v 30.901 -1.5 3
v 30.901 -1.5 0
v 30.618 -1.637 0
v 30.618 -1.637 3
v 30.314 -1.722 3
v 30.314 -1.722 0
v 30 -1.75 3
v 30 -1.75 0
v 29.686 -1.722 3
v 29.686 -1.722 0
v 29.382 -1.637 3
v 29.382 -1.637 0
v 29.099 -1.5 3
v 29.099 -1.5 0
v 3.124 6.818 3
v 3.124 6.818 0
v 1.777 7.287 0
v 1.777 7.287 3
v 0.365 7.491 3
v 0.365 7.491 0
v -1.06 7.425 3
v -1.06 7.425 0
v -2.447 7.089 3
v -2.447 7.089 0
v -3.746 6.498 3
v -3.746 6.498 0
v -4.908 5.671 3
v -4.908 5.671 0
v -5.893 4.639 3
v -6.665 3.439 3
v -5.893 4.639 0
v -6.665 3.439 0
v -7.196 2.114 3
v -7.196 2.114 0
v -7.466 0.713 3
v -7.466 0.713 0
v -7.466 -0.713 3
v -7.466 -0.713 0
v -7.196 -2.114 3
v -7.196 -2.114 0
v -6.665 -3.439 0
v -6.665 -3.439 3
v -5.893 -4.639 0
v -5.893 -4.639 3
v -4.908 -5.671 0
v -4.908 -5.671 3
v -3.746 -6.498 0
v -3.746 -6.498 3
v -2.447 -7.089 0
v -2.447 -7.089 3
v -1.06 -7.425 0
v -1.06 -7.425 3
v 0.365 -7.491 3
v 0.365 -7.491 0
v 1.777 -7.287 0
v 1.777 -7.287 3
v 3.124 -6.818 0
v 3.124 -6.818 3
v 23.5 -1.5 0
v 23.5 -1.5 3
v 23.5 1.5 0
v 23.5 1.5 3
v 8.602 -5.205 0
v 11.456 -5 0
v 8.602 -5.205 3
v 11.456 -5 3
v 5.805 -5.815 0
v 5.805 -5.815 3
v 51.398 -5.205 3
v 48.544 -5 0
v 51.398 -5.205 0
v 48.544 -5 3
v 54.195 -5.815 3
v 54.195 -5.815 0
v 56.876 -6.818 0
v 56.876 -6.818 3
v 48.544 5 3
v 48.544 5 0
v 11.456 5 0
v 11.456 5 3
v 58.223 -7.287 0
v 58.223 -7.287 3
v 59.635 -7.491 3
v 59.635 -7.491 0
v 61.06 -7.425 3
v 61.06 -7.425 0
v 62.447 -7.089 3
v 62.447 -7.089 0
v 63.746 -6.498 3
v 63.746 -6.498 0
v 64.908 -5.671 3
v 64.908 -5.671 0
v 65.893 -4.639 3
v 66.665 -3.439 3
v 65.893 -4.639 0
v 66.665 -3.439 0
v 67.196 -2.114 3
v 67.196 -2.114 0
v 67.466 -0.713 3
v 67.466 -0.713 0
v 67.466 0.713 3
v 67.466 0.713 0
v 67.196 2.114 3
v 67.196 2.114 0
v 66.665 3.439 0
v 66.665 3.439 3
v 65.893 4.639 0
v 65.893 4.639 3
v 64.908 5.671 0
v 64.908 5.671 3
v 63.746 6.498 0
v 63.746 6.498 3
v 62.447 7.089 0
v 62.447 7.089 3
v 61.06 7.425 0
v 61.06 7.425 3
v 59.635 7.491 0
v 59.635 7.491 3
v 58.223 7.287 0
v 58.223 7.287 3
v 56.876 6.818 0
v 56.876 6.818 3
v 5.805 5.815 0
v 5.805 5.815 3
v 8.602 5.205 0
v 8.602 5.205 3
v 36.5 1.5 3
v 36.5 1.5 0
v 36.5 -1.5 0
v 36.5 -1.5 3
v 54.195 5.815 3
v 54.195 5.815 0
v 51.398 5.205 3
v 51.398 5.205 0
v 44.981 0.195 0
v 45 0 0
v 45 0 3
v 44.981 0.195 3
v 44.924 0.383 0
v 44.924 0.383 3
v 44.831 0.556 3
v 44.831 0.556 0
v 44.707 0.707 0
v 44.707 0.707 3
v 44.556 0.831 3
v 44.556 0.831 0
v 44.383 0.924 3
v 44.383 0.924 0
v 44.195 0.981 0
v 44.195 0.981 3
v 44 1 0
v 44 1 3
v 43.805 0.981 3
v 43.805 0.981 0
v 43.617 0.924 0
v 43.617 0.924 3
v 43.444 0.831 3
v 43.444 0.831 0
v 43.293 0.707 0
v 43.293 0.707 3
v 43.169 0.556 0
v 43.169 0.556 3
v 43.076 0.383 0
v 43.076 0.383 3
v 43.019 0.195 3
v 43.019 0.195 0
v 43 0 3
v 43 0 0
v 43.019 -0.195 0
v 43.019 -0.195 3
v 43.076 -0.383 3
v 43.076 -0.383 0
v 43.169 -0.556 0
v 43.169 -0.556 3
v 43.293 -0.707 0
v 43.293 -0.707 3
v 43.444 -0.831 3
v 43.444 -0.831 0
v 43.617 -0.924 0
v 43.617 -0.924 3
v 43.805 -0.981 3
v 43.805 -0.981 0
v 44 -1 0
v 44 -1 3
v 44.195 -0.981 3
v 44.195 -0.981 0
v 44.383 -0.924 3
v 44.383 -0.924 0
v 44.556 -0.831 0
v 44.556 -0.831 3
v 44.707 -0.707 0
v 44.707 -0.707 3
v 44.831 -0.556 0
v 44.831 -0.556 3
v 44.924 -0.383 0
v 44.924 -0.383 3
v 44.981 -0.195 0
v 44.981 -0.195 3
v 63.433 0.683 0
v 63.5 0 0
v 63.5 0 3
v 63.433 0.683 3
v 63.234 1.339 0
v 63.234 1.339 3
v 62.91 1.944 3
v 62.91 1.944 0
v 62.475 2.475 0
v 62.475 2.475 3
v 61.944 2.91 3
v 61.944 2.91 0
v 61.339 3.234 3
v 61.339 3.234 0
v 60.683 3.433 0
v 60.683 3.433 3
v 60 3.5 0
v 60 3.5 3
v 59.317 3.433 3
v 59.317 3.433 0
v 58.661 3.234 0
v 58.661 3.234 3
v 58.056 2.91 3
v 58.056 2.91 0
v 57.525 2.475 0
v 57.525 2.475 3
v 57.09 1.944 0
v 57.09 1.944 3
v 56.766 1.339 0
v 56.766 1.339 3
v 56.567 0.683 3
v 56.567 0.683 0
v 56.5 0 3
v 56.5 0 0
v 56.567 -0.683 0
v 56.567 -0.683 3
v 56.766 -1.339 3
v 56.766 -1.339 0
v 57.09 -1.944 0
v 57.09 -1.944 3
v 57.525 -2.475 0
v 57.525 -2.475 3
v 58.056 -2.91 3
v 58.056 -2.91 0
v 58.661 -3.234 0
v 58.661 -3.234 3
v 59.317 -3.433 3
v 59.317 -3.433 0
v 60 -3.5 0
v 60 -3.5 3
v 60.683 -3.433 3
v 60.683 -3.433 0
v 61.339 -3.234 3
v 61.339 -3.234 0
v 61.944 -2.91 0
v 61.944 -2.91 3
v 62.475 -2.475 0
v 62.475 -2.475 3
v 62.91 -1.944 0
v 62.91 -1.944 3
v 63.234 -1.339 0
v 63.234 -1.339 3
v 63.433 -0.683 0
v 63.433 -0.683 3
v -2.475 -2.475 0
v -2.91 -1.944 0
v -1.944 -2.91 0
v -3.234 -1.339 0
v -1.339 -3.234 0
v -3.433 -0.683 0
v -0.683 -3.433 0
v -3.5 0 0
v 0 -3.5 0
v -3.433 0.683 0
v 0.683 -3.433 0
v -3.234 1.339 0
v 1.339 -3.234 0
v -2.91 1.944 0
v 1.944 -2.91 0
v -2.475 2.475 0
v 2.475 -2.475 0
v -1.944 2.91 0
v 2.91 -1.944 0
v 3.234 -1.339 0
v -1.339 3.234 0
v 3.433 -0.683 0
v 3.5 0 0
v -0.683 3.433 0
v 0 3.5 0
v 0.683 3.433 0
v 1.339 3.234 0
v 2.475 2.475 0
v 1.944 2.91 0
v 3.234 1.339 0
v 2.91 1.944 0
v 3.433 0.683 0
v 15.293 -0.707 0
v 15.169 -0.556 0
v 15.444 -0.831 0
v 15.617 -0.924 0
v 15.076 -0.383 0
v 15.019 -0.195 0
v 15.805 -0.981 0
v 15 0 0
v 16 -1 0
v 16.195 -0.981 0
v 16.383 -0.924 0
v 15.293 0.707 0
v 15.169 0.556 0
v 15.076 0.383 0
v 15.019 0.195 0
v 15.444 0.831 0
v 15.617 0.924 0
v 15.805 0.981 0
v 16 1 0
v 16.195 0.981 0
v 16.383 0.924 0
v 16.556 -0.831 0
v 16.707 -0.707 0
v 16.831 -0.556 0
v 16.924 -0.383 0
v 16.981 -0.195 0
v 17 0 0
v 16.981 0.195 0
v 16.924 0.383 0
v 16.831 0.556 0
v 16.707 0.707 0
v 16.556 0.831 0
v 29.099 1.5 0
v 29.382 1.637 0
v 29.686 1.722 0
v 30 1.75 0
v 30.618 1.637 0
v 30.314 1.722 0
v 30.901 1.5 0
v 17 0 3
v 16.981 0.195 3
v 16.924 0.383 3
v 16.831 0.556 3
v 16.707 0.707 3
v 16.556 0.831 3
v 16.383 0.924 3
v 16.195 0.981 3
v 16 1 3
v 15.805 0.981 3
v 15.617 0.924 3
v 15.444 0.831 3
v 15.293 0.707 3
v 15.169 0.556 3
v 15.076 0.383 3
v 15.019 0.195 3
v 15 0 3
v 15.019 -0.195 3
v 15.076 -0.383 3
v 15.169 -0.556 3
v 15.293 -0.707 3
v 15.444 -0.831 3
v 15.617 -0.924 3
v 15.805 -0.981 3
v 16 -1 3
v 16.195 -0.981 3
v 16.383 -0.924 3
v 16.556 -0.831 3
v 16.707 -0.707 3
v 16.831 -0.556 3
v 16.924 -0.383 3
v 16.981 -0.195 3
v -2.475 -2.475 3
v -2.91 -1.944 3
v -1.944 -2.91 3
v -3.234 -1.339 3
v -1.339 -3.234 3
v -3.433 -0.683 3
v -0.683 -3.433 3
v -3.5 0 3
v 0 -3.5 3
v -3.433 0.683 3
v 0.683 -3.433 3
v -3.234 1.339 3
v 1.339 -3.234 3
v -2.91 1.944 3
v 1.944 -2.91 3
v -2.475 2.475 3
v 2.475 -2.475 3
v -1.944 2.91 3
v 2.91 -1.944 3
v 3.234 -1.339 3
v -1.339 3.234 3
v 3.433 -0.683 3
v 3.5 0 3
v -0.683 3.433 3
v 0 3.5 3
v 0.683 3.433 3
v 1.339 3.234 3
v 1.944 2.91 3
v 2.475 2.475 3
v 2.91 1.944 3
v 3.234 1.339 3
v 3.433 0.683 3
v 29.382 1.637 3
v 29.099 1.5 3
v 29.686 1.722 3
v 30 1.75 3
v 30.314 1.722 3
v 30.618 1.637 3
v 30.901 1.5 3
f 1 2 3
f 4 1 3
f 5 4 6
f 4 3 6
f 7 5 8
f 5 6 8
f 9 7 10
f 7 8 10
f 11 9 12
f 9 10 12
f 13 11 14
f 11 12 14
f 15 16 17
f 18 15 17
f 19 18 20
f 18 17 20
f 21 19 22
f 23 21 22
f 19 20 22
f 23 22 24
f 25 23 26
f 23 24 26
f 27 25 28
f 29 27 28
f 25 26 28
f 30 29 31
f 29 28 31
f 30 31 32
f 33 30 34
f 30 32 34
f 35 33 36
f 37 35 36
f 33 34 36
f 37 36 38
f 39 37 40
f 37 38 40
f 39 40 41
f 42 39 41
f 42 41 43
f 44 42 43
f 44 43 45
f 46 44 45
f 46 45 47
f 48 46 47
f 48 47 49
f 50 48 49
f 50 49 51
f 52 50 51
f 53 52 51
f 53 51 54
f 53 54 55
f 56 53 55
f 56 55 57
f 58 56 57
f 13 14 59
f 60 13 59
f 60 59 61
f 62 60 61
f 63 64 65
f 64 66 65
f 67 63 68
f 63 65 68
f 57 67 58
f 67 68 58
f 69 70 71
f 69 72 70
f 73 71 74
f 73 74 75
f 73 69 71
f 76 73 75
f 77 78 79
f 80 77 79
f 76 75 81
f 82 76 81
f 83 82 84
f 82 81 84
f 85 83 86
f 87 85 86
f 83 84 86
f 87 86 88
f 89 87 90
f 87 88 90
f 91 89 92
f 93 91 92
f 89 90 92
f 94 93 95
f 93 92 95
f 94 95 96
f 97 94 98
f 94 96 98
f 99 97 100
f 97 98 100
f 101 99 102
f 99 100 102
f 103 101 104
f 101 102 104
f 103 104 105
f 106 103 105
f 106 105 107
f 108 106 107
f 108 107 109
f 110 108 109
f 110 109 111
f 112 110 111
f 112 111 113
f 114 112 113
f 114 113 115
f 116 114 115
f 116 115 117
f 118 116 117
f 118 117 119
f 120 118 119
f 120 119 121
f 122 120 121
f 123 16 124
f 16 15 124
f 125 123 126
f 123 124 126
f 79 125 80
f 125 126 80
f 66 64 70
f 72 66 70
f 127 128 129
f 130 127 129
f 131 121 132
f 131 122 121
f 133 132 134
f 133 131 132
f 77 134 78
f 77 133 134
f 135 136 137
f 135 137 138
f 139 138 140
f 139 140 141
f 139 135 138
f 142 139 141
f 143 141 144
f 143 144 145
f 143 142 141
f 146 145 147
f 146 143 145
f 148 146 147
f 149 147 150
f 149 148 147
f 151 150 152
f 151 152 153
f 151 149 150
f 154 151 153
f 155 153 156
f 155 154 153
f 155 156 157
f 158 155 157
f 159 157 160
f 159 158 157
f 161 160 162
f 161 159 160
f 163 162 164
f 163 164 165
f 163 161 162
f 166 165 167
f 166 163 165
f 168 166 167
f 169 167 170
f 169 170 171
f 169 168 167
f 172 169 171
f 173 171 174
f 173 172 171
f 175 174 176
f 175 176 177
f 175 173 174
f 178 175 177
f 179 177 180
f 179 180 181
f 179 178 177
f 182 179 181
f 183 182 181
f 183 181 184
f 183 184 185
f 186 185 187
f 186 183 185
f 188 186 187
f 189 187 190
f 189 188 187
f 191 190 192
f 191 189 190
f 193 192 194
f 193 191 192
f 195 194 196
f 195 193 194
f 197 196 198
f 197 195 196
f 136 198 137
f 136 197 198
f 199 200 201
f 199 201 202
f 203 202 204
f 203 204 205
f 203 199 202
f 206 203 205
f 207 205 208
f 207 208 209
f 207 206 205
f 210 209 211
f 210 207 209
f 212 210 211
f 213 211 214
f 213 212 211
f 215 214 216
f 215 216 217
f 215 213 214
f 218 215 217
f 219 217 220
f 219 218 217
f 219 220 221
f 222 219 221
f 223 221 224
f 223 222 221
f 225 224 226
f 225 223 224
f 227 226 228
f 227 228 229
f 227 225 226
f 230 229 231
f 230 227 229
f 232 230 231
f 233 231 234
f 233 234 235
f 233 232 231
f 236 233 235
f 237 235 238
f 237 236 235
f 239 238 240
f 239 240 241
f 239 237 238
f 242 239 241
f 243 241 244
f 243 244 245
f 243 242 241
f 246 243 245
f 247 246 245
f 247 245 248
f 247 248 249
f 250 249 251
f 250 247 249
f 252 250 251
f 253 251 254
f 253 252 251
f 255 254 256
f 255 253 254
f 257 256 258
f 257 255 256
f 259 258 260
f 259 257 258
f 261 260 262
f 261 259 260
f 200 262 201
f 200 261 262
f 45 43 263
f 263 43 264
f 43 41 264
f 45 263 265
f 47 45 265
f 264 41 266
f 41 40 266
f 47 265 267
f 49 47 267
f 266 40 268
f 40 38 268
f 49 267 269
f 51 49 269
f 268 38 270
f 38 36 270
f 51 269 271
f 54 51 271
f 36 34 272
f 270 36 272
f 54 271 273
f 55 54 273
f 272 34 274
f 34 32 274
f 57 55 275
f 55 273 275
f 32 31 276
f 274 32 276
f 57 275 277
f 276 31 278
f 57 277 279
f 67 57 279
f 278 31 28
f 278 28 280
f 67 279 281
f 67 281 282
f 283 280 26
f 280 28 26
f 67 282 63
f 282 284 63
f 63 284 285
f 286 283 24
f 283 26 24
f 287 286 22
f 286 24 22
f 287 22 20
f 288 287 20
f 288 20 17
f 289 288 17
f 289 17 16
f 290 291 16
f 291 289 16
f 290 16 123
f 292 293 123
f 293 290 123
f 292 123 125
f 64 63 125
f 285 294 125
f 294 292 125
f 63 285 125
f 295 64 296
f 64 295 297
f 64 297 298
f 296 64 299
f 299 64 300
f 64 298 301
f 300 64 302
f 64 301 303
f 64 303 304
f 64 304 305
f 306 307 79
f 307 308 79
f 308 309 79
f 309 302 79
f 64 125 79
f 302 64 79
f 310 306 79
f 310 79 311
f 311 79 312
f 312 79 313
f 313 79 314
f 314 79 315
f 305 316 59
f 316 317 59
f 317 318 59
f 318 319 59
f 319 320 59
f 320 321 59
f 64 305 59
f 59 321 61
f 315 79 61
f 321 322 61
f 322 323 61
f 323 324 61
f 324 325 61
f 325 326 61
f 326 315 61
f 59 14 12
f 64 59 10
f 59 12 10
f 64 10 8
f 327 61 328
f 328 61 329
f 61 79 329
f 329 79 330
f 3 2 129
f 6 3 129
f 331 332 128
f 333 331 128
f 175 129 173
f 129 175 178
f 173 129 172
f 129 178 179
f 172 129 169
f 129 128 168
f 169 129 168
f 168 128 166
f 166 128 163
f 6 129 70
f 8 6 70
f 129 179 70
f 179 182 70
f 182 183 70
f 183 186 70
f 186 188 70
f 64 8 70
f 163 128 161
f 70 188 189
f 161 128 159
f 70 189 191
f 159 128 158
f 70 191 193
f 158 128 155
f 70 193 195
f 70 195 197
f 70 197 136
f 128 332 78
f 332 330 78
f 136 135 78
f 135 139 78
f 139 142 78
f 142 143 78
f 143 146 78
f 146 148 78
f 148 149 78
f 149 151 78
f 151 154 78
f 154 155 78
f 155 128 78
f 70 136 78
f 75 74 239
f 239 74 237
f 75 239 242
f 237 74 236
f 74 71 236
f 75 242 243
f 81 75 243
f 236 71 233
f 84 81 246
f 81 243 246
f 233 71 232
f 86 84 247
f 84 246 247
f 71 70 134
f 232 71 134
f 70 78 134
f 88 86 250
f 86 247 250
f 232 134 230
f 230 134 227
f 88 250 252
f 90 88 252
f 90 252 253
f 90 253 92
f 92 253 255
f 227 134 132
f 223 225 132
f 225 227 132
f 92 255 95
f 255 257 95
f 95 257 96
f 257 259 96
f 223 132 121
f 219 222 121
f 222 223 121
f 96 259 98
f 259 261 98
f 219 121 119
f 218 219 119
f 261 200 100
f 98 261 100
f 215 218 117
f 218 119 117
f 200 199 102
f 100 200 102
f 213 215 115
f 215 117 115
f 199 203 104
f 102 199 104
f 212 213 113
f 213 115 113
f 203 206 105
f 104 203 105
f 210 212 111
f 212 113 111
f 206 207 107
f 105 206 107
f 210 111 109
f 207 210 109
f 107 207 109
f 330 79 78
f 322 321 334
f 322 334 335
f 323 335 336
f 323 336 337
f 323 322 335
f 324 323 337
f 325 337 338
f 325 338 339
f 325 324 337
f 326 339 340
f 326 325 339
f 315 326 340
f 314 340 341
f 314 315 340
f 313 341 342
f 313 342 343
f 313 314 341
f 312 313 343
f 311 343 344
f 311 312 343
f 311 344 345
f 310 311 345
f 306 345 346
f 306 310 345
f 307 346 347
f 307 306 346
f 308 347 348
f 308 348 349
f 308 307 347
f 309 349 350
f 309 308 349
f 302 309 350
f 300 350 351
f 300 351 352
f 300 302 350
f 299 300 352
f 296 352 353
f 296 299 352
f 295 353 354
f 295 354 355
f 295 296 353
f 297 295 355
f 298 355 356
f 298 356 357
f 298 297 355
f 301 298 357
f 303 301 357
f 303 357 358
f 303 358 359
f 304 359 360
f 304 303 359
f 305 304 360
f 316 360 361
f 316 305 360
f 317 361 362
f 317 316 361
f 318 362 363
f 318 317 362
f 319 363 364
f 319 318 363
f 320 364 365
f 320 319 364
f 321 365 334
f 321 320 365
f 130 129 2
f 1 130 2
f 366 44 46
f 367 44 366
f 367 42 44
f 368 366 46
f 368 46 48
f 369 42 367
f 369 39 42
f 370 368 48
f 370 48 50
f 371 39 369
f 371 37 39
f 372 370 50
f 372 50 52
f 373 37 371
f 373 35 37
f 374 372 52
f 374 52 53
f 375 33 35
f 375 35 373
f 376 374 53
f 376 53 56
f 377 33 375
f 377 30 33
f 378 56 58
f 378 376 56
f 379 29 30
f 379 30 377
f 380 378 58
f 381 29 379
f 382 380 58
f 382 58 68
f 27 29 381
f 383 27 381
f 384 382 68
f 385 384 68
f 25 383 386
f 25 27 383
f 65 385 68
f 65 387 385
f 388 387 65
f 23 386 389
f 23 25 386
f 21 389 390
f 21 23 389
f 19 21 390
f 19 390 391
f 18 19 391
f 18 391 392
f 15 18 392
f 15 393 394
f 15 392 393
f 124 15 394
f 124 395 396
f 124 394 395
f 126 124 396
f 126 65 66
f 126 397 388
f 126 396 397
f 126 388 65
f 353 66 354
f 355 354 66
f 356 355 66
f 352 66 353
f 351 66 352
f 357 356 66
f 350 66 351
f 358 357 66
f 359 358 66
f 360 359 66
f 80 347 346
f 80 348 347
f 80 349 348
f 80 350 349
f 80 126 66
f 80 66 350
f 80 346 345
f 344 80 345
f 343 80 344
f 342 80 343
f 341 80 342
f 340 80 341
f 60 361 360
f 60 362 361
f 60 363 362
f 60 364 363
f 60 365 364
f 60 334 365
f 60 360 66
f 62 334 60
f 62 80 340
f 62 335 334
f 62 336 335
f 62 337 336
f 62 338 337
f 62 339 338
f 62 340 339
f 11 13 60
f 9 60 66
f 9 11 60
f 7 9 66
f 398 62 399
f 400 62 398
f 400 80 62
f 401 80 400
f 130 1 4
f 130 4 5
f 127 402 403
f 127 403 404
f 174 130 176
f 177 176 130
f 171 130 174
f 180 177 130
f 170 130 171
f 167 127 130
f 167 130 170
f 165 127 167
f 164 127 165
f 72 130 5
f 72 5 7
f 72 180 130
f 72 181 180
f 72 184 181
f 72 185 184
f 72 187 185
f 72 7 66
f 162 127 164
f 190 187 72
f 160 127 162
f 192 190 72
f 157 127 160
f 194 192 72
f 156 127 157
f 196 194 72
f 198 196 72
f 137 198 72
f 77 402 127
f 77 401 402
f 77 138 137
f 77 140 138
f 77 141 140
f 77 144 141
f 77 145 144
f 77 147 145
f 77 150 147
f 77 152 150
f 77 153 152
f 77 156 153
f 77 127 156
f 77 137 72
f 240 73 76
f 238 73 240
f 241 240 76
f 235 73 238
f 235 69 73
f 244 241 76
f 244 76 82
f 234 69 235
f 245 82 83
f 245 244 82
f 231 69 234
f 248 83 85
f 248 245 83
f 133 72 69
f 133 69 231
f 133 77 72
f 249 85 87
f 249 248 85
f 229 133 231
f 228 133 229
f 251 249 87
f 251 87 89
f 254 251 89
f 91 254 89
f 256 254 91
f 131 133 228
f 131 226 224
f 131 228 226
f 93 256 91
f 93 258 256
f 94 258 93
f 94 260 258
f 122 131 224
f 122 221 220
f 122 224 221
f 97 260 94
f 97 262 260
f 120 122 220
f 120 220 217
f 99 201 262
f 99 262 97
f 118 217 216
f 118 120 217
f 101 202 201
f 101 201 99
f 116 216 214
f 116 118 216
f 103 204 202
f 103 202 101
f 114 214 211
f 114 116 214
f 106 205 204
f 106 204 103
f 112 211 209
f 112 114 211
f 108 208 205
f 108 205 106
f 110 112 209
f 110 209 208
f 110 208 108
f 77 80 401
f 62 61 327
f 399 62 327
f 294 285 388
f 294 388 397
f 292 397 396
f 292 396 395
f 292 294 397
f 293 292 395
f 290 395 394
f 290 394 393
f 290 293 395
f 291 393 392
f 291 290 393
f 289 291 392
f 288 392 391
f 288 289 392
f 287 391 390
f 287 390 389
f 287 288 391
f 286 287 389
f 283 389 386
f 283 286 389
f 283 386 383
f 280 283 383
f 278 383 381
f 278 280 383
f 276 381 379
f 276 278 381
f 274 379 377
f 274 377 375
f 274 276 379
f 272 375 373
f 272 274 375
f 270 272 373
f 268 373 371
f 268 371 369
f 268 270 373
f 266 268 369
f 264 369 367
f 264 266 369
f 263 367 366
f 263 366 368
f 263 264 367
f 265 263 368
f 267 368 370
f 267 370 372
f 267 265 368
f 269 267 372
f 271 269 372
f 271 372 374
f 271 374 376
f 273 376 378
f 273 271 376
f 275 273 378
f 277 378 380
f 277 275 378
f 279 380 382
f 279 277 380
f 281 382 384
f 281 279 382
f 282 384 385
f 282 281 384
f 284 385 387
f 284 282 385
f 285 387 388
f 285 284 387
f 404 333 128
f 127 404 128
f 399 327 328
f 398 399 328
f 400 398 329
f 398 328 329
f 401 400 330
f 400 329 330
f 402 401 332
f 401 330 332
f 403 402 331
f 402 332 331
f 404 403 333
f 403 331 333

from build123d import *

# Parameters (mm, degrees)
ESBO_O1_R                = 1
ESBO_O1_R_2              = 3.5
RESSALTO_EXTRUS_O1_DEPTH = 3
FILETE1_R                = 20


with BuildPart() as part:
    # Esboço1 → Ressalto-extrusão1 (new body)
    with BuildSketch(Plane.XY):
        with BuildLine():
            Line((5.590169944, -5), (54.409830056, -5))
            ThreePointArc((54.409830056, -5), (67.5, 0), (54.409830056, 5))
            Line((54.409830056, 5), (5.590169944, 5))
            ThreePointArc((5.590169944, 5), (-7.5, 0), (5.590169944, -5))
        make_face()
        with Locations((44, 0)):
            Circle(ESBO_O1_R, mode=Mode.SUBTRACT)
        with Locations((16, 0)):
            Circle(ESBO_O1_R, mode=Mode.SUBTRACT)
        Circle(ESBO_O1_R_2, mode=Mode.SUBTRACT)
        with Locations((60, 0)):
            Circle(ESBO_O1_R_2, mode=Mode.SUBTRACT)
        with BuildLine():
            Line((30.901387819, 1.5), (36.5, 1.5))
            Line((36.5, 1.5), (36.5, -1.5))
            Line((36.5, -1.5), (30.901387819, -1.5))
            ThreePointArc((30.901387819, -1.5), (30, -1.75), (29.098612181, -1.5))
            Line((29.098612181, -1.5), (23.5, -1.5))
            Line((23.5, -1.5), (23.5, 1.5))
            Line((23.5, 1.5), (29.098612181, 1.5))
            ThreePointArc((29.098612181, 1.5), (30, 1.75), (30.901387819, 1.5))
        make_face(mode=Mode.SUBTRACT)
    extrude(amount=RESSALTO_EXTRUS_O1_DEPTH)

    # Filete1
    filete1_edges = [part.edges().sort_by_distance(p)[0] for p in [
        (54.409830056, -5, 1.5),
        (5.590169944, -5, 1.5),
        (5.590169944, 5, 1.5),
        (54.409830056, 5, 1.5),
    ]]
    fillet(filete1_edges, radius=FILETE1_R)


solid = part.part
